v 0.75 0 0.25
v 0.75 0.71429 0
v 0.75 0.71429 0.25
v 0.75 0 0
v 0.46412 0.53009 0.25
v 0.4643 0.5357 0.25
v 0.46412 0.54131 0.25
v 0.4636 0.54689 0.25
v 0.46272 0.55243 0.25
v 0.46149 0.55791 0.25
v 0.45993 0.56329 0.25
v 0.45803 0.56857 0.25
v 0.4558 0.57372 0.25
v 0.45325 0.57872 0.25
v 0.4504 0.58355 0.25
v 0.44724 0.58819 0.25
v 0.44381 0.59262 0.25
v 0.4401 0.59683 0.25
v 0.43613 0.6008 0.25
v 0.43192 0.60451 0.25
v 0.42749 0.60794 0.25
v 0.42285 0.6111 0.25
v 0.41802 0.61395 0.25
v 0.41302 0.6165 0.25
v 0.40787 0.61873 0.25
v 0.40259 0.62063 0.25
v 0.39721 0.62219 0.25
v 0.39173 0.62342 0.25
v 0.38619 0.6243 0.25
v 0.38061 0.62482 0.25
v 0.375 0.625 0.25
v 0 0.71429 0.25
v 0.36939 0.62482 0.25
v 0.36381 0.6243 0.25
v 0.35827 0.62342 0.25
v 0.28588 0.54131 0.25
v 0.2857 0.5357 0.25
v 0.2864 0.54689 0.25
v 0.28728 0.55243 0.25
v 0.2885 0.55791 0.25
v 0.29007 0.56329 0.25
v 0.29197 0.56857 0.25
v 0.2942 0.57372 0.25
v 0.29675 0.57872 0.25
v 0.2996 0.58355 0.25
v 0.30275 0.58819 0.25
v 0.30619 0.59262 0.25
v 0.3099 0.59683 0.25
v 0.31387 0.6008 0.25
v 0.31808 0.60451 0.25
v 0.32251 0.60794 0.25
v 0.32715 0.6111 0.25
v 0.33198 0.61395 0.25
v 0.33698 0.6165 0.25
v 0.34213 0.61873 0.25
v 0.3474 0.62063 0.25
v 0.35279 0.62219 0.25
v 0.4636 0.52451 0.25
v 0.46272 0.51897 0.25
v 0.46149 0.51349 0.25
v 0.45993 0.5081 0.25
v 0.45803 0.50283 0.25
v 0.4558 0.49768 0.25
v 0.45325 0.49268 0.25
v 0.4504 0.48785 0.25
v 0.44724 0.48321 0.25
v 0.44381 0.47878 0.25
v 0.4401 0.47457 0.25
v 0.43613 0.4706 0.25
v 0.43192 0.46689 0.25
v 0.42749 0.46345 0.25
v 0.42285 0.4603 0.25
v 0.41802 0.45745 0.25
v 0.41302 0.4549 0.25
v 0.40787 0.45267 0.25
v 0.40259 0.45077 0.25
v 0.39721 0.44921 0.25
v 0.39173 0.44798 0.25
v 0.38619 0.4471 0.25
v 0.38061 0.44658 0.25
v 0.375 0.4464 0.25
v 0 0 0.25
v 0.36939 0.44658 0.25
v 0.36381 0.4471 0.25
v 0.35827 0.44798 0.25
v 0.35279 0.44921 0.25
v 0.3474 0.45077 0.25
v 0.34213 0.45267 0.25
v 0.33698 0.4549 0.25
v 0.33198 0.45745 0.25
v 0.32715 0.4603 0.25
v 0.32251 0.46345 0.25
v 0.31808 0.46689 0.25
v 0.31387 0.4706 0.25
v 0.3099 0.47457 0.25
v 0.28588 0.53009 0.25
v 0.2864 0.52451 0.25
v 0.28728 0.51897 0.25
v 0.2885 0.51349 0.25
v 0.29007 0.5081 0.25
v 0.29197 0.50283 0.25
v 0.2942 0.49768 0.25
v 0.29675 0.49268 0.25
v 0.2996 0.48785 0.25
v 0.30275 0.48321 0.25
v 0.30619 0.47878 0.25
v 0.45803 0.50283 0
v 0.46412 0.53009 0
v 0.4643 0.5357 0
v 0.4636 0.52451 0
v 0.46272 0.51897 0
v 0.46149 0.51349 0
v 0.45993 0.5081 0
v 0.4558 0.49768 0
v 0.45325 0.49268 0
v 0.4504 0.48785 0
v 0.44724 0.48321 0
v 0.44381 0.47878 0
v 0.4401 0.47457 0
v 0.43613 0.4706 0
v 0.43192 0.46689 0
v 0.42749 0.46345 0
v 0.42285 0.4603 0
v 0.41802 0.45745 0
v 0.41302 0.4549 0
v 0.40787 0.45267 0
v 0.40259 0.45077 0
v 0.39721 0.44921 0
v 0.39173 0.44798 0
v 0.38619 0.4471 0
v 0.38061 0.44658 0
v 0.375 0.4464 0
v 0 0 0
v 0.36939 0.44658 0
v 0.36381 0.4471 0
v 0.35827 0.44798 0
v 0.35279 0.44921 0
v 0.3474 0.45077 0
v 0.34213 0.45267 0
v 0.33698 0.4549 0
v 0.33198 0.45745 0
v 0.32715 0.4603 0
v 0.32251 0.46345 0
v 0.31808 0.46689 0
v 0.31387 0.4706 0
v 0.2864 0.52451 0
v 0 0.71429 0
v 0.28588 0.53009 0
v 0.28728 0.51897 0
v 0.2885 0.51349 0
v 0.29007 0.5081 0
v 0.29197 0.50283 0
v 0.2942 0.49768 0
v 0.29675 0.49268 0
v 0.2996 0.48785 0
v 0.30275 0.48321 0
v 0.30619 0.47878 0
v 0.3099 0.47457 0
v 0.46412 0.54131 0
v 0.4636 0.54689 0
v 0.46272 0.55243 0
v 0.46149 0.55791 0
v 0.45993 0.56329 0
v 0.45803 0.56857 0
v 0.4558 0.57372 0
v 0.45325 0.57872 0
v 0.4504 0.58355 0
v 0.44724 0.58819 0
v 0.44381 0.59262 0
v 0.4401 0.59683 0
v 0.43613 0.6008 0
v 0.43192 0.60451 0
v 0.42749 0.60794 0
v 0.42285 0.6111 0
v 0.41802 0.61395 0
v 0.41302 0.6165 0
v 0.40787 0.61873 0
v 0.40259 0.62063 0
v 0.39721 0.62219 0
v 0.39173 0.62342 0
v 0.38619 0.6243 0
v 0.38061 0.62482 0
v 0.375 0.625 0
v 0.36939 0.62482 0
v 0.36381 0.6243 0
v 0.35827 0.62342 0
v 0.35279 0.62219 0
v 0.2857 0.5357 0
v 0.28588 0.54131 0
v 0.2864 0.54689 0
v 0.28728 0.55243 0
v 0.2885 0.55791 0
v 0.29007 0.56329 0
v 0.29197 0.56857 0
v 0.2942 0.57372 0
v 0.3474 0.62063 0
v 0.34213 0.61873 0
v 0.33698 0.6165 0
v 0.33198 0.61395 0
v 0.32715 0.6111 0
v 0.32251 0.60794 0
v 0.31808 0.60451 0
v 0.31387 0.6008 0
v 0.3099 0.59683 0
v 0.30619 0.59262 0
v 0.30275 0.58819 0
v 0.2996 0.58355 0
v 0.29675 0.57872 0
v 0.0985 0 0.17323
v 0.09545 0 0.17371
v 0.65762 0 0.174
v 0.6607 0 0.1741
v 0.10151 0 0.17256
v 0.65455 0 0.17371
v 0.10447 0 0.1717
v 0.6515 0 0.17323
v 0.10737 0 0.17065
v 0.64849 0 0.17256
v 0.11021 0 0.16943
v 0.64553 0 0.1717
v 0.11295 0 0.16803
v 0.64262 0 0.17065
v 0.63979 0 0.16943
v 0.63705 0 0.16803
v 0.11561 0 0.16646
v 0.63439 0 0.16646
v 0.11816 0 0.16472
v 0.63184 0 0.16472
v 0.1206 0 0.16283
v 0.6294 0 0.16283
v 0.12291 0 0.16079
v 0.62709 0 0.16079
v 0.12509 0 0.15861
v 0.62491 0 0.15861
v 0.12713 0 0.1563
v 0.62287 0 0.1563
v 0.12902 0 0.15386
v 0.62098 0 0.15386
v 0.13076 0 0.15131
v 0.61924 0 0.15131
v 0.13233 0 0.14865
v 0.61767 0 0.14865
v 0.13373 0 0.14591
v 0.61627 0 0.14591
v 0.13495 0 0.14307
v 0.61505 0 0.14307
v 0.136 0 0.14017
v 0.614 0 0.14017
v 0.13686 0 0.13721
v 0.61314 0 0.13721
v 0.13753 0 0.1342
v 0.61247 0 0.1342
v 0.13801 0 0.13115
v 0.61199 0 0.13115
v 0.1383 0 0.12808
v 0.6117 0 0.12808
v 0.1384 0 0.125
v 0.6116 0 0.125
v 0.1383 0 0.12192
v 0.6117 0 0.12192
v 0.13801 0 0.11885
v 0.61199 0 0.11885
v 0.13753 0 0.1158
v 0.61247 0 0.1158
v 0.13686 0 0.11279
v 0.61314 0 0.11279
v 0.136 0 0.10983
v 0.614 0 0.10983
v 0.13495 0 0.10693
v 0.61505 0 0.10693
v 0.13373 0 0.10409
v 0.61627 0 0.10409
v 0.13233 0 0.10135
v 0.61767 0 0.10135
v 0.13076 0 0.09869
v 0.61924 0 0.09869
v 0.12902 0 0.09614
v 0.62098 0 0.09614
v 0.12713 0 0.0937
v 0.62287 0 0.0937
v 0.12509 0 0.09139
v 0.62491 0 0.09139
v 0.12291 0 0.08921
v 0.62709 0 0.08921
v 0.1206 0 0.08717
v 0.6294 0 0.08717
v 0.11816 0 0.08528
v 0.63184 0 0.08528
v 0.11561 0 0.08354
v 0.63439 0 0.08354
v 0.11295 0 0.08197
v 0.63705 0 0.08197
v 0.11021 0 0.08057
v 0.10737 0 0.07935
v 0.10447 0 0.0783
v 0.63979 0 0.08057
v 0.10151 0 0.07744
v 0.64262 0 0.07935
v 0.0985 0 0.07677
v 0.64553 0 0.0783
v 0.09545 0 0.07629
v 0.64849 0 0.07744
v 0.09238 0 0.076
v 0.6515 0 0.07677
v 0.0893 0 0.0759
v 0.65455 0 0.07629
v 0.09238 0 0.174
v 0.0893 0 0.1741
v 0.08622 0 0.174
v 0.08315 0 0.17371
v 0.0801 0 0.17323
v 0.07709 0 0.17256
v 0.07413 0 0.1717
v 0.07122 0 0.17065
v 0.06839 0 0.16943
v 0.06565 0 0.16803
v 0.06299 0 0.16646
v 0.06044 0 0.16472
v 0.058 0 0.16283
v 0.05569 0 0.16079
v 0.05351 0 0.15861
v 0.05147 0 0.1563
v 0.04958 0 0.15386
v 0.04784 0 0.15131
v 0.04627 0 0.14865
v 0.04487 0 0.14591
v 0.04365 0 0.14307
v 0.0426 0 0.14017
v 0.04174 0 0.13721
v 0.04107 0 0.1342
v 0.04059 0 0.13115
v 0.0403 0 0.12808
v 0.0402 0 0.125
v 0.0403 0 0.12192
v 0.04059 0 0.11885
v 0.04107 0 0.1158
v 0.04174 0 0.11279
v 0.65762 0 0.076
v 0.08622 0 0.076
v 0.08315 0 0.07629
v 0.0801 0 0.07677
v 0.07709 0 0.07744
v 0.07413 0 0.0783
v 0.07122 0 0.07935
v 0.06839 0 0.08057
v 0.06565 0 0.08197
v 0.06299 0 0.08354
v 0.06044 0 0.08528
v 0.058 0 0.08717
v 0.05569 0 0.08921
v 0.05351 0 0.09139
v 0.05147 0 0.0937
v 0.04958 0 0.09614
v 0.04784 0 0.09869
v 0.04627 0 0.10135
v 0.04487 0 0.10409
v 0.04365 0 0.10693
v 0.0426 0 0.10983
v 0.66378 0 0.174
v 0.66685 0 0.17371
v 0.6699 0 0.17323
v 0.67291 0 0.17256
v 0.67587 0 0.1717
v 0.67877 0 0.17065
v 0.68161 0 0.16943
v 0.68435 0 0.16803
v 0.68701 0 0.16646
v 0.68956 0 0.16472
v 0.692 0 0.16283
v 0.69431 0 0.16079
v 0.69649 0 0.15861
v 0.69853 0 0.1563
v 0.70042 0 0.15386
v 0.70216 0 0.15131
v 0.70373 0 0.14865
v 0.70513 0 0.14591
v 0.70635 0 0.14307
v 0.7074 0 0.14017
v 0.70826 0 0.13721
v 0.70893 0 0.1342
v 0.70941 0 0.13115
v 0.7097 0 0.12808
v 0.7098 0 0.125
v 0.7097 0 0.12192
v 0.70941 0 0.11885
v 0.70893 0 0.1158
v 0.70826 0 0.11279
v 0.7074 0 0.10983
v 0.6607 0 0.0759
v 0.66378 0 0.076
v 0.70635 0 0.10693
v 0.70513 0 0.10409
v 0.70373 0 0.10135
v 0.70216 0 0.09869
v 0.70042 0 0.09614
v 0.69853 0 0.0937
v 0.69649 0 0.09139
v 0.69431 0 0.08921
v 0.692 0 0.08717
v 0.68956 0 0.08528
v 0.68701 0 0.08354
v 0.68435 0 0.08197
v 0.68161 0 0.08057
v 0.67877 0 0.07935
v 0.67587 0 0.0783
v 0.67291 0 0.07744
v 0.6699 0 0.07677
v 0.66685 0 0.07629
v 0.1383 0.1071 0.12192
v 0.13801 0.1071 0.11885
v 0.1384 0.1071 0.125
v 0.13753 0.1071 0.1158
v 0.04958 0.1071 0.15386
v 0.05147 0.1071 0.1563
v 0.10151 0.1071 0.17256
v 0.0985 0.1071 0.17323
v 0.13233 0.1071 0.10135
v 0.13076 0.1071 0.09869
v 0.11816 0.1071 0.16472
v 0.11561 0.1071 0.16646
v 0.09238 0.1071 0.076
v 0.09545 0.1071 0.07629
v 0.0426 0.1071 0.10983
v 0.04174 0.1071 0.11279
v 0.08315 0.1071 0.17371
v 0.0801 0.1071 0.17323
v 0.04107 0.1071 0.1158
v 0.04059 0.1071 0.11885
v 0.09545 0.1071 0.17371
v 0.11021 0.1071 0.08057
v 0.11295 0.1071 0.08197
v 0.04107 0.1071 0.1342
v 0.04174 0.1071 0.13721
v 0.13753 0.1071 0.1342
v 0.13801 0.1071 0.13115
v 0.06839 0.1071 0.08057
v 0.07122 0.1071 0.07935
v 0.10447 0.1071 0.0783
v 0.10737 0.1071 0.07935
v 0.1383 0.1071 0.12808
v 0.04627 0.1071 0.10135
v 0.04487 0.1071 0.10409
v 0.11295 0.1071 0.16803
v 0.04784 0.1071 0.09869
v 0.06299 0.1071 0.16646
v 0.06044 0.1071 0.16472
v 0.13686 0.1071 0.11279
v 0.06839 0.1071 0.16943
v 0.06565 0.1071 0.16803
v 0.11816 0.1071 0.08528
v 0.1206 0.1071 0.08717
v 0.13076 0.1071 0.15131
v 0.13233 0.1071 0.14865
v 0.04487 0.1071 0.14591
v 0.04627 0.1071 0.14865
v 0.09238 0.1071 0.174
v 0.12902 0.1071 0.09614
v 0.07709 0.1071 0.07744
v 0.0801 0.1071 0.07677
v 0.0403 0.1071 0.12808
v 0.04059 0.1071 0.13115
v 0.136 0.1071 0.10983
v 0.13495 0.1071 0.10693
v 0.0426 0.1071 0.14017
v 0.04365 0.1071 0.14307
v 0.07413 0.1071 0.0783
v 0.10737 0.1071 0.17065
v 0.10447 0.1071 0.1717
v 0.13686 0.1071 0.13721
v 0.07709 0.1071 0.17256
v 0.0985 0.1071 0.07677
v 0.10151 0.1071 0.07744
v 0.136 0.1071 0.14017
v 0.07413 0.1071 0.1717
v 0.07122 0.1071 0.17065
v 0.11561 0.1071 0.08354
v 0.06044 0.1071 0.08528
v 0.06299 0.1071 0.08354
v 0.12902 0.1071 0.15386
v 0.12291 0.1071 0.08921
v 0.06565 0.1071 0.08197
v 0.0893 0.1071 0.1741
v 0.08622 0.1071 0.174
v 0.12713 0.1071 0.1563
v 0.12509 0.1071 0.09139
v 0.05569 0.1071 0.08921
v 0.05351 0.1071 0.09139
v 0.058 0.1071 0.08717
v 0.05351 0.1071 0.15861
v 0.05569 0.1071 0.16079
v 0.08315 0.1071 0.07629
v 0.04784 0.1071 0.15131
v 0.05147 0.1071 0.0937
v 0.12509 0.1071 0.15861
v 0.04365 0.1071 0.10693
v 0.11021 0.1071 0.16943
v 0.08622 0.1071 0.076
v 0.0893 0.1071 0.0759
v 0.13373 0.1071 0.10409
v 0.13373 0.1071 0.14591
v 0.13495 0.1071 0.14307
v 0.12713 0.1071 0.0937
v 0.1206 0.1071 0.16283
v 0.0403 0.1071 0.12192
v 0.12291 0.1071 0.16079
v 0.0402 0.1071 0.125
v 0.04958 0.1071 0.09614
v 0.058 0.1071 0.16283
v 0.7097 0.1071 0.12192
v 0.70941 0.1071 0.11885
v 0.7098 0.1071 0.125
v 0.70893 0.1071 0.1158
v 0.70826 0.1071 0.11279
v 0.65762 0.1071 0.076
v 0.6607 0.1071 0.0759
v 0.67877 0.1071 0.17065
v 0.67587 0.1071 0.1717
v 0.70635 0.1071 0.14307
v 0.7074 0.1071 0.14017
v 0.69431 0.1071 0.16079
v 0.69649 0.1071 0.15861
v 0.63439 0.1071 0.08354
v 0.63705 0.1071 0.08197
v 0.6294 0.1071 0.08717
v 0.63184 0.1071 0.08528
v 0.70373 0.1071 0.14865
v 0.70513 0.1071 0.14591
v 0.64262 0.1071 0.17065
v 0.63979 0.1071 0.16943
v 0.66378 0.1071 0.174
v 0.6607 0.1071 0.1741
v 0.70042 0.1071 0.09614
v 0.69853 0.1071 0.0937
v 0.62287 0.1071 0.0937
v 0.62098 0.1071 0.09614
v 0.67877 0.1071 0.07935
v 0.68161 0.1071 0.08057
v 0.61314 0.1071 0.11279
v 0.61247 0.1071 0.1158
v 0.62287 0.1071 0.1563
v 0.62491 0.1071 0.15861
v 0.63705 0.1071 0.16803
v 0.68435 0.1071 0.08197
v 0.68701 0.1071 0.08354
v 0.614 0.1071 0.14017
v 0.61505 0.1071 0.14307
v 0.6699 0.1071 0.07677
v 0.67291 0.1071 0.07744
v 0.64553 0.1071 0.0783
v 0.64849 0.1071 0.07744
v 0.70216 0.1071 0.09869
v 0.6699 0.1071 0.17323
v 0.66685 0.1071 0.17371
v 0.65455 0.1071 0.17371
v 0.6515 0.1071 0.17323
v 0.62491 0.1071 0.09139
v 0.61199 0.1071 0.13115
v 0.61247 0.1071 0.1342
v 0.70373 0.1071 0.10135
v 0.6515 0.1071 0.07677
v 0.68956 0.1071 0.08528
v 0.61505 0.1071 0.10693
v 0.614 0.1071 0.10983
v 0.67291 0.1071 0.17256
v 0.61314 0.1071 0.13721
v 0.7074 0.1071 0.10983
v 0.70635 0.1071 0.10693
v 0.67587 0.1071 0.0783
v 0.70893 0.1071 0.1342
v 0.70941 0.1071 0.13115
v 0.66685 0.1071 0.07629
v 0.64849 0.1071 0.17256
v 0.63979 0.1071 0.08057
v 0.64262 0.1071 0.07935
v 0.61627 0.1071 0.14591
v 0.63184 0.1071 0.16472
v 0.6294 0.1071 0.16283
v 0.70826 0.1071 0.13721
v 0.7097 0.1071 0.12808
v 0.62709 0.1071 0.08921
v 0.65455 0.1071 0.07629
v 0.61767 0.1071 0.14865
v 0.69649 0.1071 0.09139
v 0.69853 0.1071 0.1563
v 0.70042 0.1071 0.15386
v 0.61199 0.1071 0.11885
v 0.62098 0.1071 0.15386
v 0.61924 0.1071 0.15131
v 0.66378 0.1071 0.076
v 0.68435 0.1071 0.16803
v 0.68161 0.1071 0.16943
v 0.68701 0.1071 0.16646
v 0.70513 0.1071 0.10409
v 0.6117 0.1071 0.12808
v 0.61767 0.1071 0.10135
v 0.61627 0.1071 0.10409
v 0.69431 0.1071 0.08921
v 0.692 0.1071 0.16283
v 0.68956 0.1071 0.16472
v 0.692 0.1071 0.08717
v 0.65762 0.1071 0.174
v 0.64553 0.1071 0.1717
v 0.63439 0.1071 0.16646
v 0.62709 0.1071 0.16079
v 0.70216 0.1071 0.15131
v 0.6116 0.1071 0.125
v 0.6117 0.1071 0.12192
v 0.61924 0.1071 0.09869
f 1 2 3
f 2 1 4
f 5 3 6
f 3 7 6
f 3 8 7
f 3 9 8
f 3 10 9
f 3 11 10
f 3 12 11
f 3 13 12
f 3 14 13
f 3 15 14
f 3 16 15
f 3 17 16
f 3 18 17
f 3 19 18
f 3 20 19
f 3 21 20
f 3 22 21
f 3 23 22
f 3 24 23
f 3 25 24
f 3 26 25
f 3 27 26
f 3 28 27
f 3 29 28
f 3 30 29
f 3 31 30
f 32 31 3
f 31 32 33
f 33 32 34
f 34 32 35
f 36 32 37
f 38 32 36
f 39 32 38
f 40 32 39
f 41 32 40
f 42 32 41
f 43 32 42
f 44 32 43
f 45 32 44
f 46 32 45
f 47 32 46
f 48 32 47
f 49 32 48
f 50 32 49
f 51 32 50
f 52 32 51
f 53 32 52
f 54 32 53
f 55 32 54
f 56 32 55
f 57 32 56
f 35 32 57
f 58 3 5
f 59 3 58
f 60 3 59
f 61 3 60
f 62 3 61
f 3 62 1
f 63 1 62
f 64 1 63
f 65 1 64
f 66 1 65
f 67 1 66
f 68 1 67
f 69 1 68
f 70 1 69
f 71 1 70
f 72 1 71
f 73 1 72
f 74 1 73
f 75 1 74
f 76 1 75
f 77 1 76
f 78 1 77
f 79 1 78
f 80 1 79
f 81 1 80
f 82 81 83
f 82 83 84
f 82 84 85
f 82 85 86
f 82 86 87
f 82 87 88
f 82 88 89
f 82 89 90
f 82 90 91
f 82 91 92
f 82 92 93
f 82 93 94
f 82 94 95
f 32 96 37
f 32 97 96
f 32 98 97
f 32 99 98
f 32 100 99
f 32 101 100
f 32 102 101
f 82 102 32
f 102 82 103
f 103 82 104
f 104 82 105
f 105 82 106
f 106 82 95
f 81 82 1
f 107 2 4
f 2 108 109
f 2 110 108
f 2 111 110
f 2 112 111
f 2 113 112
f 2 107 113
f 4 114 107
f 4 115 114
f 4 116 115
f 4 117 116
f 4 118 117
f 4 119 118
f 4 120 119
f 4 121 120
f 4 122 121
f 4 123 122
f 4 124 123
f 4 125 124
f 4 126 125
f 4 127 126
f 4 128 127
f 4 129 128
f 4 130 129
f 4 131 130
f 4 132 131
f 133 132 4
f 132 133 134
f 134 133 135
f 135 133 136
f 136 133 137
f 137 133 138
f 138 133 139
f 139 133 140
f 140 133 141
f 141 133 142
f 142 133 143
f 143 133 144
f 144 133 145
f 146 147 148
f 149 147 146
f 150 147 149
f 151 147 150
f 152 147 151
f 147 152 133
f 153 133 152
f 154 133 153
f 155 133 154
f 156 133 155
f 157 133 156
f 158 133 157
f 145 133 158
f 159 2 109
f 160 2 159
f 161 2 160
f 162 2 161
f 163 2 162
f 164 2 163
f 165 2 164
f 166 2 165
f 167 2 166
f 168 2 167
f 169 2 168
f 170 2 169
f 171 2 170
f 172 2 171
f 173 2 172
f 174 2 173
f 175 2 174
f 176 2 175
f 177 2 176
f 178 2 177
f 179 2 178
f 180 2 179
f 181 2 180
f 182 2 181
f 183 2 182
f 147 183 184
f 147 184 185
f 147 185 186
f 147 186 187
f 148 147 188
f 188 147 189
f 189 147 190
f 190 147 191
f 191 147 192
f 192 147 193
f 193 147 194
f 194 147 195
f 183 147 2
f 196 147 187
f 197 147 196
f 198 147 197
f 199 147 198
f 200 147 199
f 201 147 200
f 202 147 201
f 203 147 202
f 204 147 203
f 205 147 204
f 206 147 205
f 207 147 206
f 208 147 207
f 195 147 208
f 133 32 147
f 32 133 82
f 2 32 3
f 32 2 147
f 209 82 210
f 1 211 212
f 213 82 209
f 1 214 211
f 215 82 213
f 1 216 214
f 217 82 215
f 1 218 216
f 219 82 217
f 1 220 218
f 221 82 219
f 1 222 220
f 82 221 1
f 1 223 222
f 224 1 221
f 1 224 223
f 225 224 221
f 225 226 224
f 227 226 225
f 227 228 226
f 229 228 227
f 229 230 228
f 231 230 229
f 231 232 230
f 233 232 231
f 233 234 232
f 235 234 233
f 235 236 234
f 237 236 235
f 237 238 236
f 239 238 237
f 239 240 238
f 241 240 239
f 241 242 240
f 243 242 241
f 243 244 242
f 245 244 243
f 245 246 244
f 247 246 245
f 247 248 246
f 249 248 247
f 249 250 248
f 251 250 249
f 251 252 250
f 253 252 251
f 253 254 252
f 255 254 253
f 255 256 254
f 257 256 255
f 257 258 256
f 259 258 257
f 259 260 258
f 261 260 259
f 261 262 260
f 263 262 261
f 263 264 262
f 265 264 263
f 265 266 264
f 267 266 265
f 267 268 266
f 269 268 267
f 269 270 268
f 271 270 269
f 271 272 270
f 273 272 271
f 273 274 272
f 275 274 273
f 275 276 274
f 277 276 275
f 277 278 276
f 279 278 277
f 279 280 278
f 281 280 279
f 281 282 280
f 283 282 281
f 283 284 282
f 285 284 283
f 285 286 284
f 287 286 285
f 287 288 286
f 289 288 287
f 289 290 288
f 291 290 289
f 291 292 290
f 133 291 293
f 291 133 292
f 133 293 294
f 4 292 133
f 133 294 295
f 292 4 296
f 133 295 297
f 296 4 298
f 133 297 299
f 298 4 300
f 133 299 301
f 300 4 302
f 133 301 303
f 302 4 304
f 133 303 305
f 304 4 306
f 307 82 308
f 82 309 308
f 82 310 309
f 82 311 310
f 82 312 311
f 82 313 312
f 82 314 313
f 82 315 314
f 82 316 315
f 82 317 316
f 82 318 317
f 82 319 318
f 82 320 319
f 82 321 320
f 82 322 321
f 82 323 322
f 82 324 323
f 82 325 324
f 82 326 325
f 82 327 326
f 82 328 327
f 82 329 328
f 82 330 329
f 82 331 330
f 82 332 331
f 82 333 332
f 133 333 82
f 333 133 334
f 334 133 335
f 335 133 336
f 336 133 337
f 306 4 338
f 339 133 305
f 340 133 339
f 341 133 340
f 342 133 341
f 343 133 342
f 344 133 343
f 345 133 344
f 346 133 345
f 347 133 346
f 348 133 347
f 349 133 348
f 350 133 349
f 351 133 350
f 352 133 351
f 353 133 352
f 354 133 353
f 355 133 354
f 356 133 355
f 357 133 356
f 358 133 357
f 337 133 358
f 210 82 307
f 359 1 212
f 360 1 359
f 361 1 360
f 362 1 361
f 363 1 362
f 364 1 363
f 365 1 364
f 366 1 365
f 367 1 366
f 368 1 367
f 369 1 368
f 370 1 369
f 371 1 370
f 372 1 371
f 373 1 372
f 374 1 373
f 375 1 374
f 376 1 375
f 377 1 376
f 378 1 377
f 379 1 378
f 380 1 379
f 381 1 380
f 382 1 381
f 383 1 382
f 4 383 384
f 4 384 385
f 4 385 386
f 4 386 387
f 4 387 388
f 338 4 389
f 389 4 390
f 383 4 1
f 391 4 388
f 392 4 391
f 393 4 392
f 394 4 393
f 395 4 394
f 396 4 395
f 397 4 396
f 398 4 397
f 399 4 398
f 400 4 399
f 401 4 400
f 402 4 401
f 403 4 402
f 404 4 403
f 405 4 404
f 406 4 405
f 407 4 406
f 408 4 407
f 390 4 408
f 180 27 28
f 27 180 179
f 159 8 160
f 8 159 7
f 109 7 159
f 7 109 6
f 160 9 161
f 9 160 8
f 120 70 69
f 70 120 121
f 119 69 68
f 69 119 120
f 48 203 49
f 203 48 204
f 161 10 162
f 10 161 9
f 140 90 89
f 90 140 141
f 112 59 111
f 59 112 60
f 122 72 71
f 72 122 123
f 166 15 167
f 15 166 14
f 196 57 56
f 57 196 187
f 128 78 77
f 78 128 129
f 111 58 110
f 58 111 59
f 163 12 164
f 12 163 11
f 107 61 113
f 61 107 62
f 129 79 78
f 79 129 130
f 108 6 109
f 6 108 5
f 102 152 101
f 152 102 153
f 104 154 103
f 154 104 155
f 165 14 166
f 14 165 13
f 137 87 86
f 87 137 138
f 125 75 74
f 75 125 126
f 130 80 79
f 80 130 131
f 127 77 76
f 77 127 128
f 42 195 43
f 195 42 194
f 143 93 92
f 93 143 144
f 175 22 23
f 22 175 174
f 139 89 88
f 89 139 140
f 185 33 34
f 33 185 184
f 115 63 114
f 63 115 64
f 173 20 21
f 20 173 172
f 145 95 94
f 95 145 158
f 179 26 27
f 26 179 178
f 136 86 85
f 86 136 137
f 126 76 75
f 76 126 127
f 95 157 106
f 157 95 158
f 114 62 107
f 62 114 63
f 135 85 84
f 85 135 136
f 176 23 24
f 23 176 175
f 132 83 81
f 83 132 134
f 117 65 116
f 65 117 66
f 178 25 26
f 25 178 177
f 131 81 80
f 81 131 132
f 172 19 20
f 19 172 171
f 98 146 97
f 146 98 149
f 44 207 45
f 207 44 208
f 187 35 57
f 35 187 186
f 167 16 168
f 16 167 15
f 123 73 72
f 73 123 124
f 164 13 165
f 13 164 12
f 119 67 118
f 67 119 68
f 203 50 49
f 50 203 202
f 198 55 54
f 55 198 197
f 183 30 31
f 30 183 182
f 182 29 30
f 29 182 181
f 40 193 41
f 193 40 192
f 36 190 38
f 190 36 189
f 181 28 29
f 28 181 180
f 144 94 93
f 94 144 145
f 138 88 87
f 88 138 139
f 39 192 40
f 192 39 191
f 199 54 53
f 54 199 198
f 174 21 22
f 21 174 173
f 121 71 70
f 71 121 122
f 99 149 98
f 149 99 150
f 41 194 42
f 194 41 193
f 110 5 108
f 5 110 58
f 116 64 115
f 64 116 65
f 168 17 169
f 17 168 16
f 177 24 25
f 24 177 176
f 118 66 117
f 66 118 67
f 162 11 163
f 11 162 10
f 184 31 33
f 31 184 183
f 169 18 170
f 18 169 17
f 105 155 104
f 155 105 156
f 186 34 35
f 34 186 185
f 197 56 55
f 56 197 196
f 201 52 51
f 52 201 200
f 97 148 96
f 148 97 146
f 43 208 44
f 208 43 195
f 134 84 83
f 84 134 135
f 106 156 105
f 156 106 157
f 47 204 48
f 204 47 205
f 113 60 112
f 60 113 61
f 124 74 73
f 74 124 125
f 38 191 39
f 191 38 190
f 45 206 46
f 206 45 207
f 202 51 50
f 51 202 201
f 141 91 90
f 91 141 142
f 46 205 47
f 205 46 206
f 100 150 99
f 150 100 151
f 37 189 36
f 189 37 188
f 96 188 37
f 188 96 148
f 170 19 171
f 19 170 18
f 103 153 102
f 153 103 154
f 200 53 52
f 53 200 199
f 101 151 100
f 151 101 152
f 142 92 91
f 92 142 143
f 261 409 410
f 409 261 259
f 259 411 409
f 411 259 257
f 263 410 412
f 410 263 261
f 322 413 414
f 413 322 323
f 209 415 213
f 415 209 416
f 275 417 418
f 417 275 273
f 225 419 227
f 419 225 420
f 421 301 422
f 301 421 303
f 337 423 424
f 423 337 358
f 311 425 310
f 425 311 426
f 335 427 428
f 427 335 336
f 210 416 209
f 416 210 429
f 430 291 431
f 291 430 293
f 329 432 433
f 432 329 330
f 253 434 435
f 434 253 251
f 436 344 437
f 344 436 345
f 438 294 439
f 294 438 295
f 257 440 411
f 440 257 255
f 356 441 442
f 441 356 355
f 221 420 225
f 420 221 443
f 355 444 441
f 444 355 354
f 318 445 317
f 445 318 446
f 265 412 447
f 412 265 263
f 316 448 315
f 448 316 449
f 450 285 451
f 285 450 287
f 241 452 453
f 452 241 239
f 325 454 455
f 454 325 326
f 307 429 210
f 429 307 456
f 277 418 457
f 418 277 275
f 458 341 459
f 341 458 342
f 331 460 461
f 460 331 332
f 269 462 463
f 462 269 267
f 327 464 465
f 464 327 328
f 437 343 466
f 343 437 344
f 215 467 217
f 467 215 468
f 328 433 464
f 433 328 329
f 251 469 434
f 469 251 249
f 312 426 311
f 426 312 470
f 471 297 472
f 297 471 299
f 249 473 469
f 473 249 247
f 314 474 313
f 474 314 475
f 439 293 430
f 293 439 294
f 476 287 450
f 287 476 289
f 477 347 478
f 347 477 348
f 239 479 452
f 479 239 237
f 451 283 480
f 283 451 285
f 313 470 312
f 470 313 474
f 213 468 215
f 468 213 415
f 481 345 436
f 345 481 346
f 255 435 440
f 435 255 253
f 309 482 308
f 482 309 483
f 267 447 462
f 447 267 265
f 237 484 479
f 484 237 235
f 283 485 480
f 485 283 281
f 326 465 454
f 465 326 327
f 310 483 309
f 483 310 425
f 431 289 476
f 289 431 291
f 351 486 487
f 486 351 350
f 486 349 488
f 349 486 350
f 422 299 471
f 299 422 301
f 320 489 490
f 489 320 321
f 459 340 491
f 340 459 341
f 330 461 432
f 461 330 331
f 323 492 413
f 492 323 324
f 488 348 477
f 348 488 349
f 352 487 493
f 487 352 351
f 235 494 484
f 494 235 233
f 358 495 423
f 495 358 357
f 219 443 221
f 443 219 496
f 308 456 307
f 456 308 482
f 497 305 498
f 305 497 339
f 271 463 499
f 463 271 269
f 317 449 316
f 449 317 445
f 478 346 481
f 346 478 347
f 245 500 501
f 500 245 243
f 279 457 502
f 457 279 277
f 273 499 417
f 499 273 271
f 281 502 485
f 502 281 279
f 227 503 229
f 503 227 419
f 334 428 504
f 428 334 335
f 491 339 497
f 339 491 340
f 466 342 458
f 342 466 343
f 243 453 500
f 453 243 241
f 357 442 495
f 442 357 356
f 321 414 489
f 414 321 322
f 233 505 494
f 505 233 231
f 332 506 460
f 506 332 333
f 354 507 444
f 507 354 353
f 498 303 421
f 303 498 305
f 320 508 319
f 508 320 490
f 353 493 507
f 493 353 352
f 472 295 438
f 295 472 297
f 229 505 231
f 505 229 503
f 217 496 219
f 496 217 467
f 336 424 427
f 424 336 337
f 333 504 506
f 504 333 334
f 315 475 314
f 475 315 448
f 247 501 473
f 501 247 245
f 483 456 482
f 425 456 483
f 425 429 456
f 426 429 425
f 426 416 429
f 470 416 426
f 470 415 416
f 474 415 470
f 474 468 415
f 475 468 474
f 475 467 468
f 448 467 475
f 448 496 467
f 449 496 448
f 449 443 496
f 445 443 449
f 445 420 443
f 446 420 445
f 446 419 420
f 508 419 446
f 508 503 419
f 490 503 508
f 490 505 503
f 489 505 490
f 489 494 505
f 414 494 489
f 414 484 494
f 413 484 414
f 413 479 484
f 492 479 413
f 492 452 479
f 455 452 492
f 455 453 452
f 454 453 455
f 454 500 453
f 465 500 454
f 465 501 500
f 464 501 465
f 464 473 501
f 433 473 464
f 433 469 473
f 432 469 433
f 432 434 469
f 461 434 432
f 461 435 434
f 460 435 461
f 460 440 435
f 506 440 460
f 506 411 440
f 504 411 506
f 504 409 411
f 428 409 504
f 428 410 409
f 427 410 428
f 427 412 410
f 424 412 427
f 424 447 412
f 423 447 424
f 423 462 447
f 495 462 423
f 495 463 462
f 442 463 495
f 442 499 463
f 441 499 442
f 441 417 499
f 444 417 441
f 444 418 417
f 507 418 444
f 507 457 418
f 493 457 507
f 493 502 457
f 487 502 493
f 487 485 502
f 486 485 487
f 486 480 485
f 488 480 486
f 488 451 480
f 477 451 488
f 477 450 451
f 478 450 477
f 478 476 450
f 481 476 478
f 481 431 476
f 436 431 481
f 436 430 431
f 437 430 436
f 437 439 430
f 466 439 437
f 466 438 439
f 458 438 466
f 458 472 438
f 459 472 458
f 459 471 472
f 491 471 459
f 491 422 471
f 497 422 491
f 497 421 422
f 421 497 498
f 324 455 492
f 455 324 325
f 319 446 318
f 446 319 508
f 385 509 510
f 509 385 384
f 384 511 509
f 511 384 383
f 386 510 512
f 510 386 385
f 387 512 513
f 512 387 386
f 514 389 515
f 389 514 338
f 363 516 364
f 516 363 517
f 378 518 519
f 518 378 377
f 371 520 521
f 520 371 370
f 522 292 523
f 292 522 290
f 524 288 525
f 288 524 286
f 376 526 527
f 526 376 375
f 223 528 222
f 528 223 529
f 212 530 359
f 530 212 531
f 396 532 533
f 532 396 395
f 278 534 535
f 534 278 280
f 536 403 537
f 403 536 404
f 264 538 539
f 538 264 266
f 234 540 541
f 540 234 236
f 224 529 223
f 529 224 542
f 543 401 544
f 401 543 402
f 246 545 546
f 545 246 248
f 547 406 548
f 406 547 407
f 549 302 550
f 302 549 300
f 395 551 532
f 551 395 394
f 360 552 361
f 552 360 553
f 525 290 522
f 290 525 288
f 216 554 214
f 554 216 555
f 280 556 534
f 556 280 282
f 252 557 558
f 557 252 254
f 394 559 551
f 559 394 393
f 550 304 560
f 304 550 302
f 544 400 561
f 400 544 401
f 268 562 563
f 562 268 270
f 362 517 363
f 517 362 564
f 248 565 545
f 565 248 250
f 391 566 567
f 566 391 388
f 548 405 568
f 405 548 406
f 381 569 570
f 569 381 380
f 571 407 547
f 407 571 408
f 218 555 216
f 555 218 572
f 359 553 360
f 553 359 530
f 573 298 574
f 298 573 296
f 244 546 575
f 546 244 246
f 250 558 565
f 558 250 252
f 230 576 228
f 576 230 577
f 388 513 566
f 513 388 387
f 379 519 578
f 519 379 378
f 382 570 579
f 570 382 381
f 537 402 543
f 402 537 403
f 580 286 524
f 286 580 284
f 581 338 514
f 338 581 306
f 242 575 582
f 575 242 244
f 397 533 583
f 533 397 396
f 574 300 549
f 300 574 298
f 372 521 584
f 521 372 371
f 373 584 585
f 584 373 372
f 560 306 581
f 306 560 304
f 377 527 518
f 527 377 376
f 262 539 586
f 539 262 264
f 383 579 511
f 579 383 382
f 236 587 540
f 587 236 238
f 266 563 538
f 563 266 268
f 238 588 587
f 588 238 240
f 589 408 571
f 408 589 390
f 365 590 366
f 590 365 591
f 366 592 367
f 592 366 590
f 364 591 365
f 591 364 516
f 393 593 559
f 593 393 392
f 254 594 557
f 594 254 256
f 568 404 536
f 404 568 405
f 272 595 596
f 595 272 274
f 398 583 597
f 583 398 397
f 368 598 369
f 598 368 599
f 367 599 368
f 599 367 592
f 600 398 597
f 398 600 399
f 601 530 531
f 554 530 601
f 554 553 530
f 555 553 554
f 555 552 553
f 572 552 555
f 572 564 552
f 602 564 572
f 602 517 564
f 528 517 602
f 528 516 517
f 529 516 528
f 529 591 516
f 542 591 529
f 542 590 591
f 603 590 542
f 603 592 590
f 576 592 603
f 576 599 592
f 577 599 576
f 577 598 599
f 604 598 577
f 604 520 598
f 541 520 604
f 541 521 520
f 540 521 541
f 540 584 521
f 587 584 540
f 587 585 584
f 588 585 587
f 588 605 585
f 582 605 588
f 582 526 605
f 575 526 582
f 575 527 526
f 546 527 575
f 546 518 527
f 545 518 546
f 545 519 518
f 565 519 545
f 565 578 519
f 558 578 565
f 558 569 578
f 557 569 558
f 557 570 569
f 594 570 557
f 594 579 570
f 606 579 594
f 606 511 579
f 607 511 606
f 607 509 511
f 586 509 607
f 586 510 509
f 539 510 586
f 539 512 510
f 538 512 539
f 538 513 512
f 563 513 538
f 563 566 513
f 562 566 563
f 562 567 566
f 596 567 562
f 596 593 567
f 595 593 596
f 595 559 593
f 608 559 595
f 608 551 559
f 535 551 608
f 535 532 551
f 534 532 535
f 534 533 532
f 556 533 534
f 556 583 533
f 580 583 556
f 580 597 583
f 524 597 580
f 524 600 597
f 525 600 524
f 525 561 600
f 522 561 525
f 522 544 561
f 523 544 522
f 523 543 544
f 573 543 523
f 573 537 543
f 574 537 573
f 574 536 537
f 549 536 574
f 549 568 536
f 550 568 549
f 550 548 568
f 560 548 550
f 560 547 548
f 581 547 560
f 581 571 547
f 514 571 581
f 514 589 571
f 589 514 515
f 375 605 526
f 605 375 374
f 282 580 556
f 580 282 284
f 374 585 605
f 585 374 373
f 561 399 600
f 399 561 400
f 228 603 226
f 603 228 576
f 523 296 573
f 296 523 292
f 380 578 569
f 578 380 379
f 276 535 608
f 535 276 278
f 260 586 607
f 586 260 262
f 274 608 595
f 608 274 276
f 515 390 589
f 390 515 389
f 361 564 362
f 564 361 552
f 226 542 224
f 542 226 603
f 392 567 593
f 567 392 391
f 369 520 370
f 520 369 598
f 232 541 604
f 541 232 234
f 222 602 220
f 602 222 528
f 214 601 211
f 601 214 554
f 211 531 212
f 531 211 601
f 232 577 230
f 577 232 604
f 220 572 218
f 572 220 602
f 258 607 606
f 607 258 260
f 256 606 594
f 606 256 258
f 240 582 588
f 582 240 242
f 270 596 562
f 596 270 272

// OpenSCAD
// Parameters
length = 0.75;       // X
width  = 0.714286;   // Y
height = 0.25;       // Z

// Top through-hole
hole_x = 0.375;
hole_y = 0.5357;
hole_r = 0.0893;

// Side blind holes (front face, axis along Y)
side_r       = 0.0491;
side_z       = 0.125;     // (0.0759 + 0.1741)/2
side_depth   = 0.1071;
side_x1      = 0.0893;
side_x2      = 0.6607;

$fn = 100;

// Main stepped block (simplified as the bounding extrusion)
module main_block() {
    cube([length, width, height]);
}

// Final model
difference() {
    main_block();

    // Upper through circular opening
    translate([hole_x, hole_y, -0.01])
        cylinder(h = height + 0.02, r = hole_r);

    // Front-side blind cylindrical cut #1
    translate([side_x1, -0.01, side_z])
        rotate([-90, 0, 0])
            cylinder(h = side_depth + 0.01, r = side_r);

    // Front-side blind cylindrical cut #2
    translate([side_x2, -0.01, side_z])
        rotate([-90, 0, 0])
            cylinder(h = side_depth + 0.01, r = side_r);
}
